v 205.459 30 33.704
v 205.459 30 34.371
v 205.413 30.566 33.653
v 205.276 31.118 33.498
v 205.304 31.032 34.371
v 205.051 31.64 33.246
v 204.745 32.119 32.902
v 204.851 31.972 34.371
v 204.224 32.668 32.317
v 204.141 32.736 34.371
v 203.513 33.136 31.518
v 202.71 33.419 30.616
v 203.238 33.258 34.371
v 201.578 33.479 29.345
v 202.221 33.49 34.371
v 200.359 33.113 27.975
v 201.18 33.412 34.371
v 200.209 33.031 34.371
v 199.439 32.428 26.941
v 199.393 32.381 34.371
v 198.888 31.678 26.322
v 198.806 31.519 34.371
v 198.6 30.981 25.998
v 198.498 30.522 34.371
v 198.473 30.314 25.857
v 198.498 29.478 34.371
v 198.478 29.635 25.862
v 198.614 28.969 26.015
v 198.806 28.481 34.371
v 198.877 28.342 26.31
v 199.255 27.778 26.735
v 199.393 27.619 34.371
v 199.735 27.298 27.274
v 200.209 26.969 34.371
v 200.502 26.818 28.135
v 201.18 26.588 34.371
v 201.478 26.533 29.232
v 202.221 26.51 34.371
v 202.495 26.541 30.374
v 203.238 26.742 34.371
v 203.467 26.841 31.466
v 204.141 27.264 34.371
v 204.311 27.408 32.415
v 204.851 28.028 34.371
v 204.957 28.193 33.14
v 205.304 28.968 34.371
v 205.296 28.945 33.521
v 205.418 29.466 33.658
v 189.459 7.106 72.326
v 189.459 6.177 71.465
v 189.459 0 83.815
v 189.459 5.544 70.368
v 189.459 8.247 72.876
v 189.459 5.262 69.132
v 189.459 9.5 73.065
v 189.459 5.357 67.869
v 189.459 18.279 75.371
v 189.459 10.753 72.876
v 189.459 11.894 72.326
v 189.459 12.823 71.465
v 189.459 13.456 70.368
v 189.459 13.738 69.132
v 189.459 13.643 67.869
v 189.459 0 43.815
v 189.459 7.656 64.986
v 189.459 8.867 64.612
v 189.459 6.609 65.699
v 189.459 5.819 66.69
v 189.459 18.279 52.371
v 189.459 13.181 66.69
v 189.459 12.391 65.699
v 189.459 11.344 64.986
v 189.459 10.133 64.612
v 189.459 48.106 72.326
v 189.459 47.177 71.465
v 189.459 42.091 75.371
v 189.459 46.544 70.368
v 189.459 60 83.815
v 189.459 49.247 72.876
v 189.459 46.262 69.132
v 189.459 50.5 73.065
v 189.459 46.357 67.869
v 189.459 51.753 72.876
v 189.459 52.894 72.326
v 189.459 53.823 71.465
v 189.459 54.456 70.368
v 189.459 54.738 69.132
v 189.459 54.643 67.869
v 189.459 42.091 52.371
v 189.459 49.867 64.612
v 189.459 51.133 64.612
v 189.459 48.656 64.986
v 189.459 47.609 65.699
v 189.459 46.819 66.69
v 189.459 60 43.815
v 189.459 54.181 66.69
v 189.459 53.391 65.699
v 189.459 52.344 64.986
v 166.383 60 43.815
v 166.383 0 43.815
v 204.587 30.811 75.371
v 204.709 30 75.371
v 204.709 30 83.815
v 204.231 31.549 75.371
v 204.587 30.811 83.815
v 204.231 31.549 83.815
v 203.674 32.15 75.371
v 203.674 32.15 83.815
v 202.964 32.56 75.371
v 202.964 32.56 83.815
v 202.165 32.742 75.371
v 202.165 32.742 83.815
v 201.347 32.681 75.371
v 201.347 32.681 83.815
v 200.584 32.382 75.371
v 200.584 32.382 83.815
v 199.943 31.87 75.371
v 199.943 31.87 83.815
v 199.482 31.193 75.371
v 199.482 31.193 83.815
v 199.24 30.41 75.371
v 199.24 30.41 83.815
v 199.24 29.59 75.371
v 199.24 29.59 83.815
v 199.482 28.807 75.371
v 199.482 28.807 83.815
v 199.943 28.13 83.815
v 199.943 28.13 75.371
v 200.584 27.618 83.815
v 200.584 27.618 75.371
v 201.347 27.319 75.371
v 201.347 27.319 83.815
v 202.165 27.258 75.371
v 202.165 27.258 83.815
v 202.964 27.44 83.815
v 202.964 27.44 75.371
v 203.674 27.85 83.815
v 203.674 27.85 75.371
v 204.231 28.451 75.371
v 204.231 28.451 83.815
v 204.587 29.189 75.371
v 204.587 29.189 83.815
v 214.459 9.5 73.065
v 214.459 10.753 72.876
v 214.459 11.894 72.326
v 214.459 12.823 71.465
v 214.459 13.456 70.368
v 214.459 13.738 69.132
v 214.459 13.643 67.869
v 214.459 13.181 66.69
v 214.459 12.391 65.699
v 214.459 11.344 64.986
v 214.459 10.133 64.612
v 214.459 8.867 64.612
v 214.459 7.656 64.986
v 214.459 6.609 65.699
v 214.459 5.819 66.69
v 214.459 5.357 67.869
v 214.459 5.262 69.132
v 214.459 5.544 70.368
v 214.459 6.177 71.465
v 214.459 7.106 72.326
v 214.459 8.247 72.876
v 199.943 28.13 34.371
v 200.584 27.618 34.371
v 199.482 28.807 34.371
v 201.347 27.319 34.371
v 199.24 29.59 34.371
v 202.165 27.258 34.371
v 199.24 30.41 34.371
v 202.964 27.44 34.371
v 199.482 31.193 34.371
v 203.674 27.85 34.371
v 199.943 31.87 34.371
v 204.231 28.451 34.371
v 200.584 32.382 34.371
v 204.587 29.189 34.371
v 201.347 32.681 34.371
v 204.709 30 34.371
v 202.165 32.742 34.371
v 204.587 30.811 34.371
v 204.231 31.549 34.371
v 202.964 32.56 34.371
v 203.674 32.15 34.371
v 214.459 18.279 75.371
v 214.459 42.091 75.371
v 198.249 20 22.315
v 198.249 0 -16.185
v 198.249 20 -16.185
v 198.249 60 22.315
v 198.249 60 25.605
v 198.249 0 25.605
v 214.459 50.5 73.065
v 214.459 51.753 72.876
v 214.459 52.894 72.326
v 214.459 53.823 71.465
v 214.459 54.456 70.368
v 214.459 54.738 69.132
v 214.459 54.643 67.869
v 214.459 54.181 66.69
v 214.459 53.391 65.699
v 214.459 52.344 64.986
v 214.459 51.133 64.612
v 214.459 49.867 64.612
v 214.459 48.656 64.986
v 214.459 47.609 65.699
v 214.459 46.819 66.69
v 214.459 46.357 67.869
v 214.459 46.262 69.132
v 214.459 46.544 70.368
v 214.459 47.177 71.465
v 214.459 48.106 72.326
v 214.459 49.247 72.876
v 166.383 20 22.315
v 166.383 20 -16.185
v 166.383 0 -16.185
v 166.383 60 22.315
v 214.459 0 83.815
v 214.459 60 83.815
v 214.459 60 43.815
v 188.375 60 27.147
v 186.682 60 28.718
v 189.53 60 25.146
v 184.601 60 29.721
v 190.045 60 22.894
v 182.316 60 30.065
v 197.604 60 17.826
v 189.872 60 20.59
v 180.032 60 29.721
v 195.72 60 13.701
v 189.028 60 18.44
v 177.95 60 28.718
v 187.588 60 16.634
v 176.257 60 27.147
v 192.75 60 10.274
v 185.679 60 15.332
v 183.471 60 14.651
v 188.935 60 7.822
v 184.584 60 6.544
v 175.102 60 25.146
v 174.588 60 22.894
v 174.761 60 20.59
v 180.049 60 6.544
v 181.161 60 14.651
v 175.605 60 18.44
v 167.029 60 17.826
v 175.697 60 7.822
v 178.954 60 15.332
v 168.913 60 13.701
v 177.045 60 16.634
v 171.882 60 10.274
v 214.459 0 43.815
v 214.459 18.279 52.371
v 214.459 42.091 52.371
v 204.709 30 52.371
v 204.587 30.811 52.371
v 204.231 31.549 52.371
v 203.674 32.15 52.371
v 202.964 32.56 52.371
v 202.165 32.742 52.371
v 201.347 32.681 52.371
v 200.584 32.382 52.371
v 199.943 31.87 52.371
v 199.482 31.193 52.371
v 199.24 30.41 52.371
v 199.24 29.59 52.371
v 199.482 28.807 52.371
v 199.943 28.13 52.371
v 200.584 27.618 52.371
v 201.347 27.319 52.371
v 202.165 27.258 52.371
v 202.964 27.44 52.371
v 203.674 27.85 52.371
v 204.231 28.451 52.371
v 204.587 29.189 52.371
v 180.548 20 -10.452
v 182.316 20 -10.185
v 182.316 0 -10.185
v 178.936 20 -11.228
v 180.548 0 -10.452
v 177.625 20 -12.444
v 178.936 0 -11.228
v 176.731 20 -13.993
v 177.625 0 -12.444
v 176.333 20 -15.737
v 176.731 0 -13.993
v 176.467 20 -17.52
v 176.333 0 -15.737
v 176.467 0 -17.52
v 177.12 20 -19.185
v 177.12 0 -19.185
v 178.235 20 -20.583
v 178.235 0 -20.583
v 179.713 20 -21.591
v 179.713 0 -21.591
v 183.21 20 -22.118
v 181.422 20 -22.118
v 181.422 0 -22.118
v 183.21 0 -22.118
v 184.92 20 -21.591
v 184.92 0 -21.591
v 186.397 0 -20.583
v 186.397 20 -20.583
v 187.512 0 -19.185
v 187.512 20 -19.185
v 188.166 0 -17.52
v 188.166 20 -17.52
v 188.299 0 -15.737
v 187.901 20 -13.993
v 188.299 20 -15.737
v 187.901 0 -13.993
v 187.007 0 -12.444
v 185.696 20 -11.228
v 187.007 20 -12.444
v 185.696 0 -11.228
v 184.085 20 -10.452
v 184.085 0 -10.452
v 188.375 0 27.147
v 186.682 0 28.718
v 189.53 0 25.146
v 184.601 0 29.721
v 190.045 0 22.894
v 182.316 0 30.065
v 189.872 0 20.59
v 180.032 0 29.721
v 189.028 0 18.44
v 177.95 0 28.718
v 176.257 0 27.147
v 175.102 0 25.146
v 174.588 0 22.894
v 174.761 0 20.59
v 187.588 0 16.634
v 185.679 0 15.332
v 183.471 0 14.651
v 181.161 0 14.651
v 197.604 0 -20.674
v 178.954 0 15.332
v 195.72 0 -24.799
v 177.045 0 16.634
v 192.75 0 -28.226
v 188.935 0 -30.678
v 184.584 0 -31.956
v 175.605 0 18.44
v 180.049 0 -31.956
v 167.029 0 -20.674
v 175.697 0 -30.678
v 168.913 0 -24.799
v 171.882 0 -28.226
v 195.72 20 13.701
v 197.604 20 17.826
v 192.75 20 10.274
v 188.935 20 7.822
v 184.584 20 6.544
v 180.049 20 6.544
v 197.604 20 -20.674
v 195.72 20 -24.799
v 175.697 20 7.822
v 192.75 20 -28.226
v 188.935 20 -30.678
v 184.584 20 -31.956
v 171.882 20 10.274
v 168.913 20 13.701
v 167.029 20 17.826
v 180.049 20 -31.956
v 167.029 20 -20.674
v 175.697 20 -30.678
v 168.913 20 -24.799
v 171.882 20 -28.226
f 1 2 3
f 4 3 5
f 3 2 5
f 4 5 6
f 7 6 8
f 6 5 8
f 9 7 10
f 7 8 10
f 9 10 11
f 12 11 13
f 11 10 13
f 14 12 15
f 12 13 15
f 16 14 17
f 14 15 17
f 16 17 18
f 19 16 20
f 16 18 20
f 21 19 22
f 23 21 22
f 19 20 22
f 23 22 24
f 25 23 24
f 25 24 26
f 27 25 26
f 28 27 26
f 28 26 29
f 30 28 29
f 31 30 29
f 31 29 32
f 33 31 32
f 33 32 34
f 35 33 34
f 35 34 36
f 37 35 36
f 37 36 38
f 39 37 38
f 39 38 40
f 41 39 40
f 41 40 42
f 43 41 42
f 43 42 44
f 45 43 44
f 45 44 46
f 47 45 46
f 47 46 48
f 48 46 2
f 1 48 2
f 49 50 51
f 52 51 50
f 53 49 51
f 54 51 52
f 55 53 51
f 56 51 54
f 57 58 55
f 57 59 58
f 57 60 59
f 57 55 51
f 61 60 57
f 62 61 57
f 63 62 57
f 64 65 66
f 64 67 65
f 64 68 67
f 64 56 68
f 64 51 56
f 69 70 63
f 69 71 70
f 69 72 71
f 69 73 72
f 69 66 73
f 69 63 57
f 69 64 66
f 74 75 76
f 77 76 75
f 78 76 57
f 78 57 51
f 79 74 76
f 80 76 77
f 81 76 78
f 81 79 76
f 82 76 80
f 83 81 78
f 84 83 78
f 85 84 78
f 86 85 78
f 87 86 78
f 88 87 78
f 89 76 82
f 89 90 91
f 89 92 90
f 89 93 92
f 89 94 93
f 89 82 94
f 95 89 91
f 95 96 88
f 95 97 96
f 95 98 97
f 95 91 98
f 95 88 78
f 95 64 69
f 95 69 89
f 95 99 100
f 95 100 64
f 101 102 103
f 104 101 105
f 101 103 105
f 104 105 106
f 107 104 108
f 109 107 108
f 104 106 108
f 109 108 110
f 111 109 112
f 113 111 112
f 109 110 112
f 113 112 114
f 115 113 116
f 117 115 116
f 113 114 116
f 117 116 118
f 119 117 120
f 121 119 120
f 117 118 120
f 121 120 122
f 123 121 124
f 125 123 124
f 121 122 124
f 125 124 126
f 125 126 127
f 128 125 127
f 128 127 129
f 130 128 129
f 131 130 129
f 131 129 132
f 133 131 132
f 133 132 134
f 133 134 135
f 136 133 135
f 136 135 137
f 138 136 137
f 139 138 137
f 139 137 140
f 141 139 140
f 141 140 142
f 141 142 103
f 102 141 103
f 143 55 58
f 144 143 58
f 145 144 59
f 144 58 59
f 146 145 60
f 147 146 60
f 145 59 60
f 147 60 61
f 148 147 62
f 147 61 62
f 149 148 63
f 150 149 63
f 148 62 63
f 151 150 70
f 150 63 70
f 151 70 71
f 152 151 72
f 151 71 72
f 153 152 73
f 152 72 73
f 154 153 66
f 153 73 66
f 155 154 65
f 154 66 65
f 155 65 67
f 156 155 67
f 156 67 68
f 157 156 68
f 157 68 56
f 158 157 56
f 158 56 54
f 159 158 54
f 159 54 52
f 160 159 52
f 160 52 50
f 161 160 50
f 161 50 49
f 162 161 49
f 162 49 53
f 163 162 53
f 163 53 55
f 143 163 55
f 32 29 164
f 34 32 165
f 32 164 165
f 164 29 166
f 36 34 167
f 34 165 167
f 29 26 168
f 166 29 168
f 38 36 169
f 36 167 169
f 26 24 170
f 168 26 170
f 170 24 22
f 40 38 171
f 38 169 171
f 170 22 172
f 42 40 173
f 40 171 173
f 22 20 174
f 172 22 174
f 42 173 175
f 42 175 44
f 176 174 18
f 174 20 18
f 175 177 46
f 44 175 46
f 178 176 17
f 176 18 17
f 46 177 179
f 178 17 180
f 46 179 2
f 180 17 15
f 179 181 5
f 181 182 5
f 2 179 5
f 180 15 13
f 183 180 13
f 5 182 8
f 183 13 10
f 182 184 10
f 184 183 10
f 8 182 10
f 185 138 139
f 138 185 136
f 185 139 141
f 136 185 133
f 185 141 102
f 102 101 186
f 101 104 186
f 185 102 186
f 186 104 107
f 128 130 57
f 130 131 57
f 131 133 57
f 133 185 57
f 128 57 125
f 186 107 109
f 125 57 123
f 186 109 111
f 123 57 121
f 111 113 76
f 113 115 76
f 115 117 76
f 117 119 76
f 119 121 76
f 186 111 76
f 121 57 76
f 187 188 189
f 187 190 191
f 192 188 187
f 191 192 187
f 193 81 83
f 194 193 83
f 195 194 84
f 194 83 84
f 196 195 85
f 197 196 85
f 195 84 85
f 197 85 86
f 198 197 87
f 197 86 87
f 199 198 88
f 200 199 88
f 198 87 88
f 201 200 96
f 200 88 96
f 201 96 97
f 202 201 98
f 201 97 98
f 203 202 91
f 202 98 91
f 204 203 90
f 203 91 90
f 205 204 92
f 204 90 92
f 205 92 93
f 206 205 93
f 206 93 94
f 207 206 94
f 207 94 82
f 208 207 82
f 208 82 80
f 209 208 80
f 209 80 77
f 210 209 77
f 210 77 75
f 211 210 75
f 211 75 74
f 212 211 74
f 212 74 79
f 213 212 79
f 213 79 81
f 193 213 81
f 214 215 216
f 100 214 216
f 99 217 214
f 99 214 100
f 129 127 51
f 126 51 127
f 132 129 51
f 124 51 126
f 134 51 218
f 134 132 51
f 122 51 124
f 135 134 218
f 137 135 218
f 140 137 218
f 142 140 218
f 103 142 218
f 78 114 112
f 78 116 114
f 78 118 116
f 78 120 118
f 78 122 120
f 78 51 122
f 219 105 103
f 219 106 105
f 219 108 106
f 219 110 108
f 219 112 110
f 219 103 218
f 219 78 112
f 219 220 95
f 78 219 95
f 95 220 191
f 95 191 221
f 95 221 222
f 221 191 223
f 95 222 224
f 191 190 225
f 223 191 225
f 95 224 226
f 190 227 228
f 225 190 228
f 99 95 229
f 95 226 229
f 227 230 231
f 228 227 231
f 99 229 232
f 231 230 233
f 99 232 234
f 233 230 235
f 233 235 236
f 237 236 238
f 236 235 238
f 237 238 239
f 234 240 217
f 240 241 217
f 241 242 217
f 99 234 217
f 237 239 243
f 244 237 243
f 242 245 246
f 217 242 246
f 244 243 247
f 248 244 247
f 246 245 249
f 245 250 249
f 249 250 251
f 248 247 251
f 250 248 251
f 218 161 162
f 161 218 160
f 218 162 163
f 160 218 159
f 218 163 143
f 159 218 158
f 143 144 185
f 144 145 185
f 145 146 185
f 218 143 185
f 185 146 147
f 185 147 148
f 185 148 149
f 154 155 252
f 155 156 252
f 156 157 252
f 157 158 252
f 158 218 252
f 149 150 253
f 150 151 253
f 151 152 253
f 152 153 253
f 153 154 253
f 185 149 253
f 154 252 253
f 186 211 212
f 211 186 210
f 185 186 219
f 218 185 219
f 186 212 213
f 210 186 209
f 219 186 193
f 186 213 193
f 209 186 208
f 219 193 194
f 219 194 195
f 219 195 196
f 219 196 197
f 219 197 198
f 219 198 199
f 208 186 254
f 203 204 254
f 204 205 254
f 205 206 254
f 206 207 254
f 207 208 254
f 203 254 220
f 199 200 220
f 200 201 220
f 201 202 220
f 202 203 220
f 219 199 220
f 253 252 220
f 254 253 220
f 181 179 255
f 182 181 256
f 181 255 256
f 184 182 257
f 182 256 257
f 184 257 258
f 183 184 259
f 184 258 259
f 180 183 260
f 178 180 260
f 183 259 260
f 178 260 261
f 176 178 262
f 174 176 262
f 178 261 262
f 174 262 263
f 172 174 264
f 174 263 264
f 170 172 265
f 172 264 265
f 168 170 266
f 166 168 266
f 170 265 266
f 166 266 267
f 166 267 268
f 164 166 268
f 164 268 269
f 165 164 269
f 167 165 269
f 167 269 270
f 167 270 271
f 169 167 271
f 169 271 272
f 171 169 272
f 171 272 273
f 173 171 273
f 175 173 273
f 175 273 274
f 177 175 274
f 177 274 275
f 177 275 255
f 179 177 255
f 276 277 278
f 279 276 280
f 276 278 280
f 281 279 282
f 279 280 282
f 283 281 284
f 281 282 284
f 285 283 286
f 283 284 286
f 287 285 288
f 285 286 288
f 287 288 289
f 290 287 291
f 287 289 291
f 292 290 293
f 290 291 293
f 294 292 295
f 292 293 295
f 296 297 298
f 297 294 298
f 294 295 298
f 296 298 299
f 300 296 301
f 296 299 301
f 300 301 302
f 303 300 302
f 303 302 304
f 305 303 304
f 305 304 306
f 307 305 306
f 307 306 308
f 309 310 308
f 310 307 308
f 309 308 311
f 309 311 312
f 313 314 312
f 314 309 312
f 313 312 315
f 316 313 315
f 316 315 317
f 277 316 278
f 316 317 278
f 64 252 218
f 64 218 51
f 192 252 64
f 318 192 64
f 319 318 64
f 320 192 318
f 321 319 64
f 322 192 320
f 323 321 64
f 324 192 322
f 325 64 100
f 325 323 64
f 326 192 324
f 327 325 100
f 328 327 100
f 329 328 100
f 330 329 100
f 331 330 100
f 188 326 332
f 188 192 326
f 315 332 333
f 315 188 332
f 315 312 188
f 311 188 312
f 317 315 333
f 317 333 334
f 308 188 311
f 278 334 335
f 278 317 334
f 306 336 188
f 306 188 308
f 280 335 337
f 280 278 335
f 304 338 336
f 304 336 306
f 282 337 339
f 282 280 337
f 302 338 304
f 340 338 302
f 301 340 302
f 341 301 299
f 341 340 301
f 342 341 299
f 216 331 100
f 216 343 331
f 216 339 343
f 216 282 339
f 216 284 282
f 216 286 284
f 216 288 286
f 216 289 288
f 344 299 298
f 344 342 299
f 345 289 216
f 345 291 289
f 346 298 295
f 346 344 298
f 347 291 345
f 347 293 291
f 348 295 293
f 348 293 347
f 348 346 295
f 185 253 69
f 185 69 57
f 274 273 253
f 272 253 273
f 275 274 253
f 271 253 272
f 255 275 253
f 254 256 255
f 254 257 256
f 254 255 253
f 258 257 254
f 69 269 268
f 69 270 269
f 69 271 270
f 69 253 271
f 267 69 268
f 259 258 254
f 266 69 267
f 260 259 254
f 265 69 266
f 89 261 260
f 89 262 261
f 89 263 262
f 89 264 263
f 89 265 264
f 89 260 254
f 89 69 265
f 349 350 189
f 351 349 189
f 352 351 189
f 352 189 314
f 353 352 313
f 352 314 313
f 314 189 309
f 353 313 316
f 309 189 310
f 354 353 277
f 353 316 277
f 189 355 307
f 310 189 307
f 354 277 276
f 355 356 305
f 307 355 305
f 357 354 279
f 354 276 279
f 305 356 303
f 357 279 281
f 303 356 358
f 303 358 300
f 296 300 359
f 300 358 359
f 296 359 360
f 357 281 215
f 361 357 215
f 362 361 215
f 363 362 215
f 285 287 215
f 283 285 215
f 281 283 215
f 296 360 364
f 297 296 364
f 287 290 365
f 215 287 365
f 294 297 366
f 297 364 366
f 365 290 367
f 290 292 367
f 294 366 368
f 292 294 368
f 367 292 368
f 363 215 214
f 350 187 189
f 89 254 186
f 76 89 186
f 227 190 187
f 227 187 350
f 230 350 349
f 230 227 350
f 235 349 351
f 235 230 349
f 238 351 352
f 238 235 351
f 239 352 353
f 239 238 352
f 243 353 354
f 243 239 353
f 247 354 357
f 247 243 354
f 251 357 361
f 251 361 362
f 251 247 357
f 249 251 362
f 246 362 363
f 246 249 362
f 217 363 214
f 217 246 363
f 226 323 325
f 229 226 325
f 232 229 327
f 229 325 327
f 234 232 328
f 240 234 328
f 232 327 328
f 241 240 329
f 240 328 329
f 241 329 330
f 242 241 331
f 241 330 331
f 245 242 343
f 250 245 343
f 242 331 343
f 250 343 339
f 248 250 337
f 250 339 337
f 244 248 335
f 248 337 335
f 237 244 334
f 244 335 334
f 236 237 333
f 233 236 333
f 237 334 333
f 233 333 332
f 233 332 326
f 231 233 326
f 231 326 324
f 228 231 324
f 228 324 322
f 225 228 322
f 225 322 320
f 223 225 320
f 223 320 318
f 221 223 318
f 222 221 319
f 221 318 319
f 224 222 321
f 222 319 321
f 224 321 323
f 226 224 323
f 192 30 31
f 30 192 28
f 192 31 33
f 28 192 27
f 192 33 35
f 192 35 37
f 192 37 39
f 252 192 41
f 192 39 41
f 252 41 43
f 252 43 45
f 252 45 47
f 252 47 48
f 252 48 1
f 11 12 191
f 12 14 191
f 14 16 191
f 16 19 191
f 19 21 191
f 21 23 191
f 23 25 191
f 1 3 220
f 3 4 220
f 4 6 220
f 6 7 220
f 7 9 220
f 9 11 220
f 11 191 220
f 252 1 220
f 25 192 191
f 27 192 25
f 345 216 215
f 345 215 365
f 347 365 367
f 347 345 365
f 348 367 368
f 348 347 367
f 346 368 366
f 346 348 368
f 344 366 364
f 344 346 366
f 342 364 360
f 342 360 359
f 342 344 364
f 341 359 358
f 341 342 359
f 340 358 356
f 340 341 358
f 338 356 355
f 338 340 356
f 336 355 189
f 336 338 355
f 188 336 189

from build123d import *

# Parameters (mm, degrees)
SKETCH_1_R          = 6
SKETCH_1_R_2        = 7.75
EXTRUDE_1_DEPTH     = 60
CUT_EXTRUDE_START   = -40
SKETCH_3_R          = 15.93293451
CUT_EXTRUDE_1_DEPTH = 40
CUT_EXTRUDE_2_DEPTH = 40
SKETCH_5_R          = 4.25
CUT_EXTRUDE_3_DEPTH = 108.890486757
SKETCH_6_W          = 30
SKETCH_6_H          = 60
SKETCH_6_R          = 4.25
EXTRUDE_2_DEPTH     = 30
SKETCH_8_W          = 30
SKETCH_8_H          = 60
CUT_EXTRUDE_4_DEPTH = 30
SKETCH_10_W         = 31.86586902
SKETCH_10_H         = 40
CUT_EXTRUDE_6_DEPTH = 110
SKETCH_13_W         = 25
SKETCH_13_H         = 60
EXTRUDE_4_DEPTH     = 40
EXTRUDE_5_DEPTH     = 60
SKETCH_15_R         = 4.25
SKETCH_15_W         = 23
SKETCH_15_H         = 23.812373312
CUT_EXTRUDE_7_DEPTH = 107.065656667
SKETCH_16_R         = 2.75
CUT_EXTRUDE_8_DEPTH = 252.064107028
SKETCH_17_R         = 3.5
CUT_EXTRUDE_9_DEPTH = 60


with BuildPart() as part:
    # 草图1 → 凸台-拉伸1 (new body)
    with BuildSketch(Plane(origin=(0, 0, 0), x_dir=(1, 0, 0), z_dir=(0, 1, 0))):
        with BuildLine():
            Line((74.517406475, 16.185183146), (74.517406475, -83.814816854))
            Line((74.517406475, -83.814816854), (106.383275494, -83.814816854))
            Line((106.383275494, -83.814816854), (106.383275494, 16.185183146))
            ThreePointArc((106.383275494, 16.185183146), (90.450340985, 32.118117656), (74.517406475, 16.185183146))
        make_face()
        with Locations(Location((90.450340985, 16.185183146, 0), (0, 0, 270))):
            Circle(SKETCH_1_R, mode=Mode.SUBTRACT)
        with Locations(Location((90.450340985, -22.314816854, 0), (0, 0, 270))):
            Circle(SKETCH_1_R_2, mode=Mode.SUBTRACT)
    extrude(amount=EXTRUDE_1_DEPTH)

    # 草图3 → 切除-拉伸1 (cut)
    with BuildSketch(Plane(origin=(0, 60, 0), x_dir=(1, 0, 0), z_dir=(0, 1, 0)).offset(CUT_EXTRUDE_START)):
        with Locations((90.450340985, 16.185183146)):
            Circle(SKETCH_3_R)
    extrude(amount=CUT_EXTRUDE_1_DEPTH, mode=Mode.SUBTRACT)

    # 草图4 → 切除-拉伸2 (cut)
    with BuildSketch(Plane(origin=(0, 60, 0), x_dir=(1, 0, 0), z_dir=(0, 1, 0))):
        with BuildLine():
            Line((74.517406475, 16.185183146), (74.517406475, -22.314816854))
            ThreePointArc((74.517406475, -22.314816854), (90.450340985, -6.381882344), (106.383275494, -22.314816854))
            Line((106.383275494, -22.314816854), (106.383275494, 16.185183146))
            Line((106.383275494, 16.185183146), (74.517406475, 16.185183146))
        make_face()
    extrude(amount=-CUT_EXTRUDE_2_DEPTH, mode=Mode.SUBTRACT)

    # 草图5 → 切除-拉伸3 (cut, through all)
    with BuildSketch(Plane.ZY.offset(-74.517406475)):
        with Locations((68.814816854, 9.5)):
            Circle(SKETCH_5_R)
        with Locations((68.814816854, 50.5)):
            Circle(SKETCH_5_R)
    extrude(amount=-CUT_EXTRUDE_3_DEPTH, mode=Mode.SUBTRACT)

    # 草图6 → 凸台-拉伸2 (add)
    with BuildSketch(Plane(origin=(106.383275494, 0, 0), x_dir=(0, 0, -1), z_dir=(1, 0, 0))):
        with Locations((-68.814816854, 30)):
            Rectangle(SKETCH_6_W, SKETCH_6_H)
        with Locations(Location((-68.814816854, 50.5, 0), (0, 0, 180))):
            Circle(SKETCH_6_R, mode=Mode.SUBTRACT)
        with Locations(Location((-68.814816854, 9.5, 0), (0, 0, 180))):
            Circle(SKETCH_6_R, mode=Mode.SUBTRACT)
    extrude(amount=EXTRUDE_2_DEPTH)


with BuildPart() as body_2:
    # 镜向1: mirrored copy
    add(part.part.mirror(Plane.ZY.offset(-136.383275494)))

    # 草图8 → 切除-拉伸4 (cut)
    with BuildSketch(Plane.ZY.offset(-136.383275494)):
        with Locations((68.814816854, 30)):
            Rectangle(SKETCH_8_W, SKETCH_8_H)
    extrude(amount=-CUT_EXTRUDE_4_DEPTH, mode=Mode.SUBTRACT)

    # 草图10 → 切除-拉伸6 (cut)
    with BuildSketch(Plane(origin=(0, 60, 0), x_dir=(1, 0, 0), z_dir=(0, 1, 0))):
        with Locations((182.316210004, -63.814816854)):
            Rectangle(SKETCH_10_W, SKETCH_10_H)
    extrude(amount=-CUT_EXTRUDE_6_DEPTH, mode=Mode.SUBTRACT)

    # 草图13 → 凸台-拉伸4 (add)
    with BuildSketch(Plane.XY.offset(43.814816854)):
        with Locations((201.95918151, 30)):
            Rectangle(SKETCH_13_W, SKETCH_13_H)
    extrude(amount=EXTRUDE_4_DEPTH)

    # 草图14 → 凸台-拉伸5 (add)
    with BuildSketch(Plane(origin=(0, 60, 0), x_dir=(1, 0, 0), z_dir=(0, 1, 0))):
        Polygon((214.45918151, -43.814816854), (198.249144514, -43.814816854), (198.249144514, -25.604816854), align=None)
    extrude(amount=-EXTRUDE_5_DEPTH)

    # 草图15 → 切除-拉伸7 (cut, through all)
    with BuildSketch(Plane.ZY.offset(-189.45918151)):
        with Locations((68.814816854, 9.5)):
            Circle(SKETCH_15_R)
        with Locations((68.814816854, 50.5)):
            Circle(SKETCH_15_R)
        with Locations((63.87118854, 30.184894764)):
            Rectangle(SKETCH_15_W, SKETCH_15_H)
    extrude(amount=-CUT_EXTRUDE_7_DEPTH, mode=Mode.SUBTRACT)

    # 草图16 → 切除-拉伸8 (cut, through all)
    with BuildSketch(Plane.XY.offset(83.814816854)):
        with Locations((201.95918151, 30)):
            Circle(SKETCH_16_R)
    extrude(amount=-CUT_EXTRUDE_8_DEPTH, mode=Mode.SUBTRACT)

    # 草图17 → 切除-拉伸9 (cut)
    with BuildSketch(Plane.XY.offset(34.37118854)):
        with Locations((201.95918151, 30)):
            Circle(SKETCH_17_R)
    extrude(amount=-CUT_EXTRUDE_9_DEPTH, mode=Mode.SUBTRACT)


solid = body_2.part
